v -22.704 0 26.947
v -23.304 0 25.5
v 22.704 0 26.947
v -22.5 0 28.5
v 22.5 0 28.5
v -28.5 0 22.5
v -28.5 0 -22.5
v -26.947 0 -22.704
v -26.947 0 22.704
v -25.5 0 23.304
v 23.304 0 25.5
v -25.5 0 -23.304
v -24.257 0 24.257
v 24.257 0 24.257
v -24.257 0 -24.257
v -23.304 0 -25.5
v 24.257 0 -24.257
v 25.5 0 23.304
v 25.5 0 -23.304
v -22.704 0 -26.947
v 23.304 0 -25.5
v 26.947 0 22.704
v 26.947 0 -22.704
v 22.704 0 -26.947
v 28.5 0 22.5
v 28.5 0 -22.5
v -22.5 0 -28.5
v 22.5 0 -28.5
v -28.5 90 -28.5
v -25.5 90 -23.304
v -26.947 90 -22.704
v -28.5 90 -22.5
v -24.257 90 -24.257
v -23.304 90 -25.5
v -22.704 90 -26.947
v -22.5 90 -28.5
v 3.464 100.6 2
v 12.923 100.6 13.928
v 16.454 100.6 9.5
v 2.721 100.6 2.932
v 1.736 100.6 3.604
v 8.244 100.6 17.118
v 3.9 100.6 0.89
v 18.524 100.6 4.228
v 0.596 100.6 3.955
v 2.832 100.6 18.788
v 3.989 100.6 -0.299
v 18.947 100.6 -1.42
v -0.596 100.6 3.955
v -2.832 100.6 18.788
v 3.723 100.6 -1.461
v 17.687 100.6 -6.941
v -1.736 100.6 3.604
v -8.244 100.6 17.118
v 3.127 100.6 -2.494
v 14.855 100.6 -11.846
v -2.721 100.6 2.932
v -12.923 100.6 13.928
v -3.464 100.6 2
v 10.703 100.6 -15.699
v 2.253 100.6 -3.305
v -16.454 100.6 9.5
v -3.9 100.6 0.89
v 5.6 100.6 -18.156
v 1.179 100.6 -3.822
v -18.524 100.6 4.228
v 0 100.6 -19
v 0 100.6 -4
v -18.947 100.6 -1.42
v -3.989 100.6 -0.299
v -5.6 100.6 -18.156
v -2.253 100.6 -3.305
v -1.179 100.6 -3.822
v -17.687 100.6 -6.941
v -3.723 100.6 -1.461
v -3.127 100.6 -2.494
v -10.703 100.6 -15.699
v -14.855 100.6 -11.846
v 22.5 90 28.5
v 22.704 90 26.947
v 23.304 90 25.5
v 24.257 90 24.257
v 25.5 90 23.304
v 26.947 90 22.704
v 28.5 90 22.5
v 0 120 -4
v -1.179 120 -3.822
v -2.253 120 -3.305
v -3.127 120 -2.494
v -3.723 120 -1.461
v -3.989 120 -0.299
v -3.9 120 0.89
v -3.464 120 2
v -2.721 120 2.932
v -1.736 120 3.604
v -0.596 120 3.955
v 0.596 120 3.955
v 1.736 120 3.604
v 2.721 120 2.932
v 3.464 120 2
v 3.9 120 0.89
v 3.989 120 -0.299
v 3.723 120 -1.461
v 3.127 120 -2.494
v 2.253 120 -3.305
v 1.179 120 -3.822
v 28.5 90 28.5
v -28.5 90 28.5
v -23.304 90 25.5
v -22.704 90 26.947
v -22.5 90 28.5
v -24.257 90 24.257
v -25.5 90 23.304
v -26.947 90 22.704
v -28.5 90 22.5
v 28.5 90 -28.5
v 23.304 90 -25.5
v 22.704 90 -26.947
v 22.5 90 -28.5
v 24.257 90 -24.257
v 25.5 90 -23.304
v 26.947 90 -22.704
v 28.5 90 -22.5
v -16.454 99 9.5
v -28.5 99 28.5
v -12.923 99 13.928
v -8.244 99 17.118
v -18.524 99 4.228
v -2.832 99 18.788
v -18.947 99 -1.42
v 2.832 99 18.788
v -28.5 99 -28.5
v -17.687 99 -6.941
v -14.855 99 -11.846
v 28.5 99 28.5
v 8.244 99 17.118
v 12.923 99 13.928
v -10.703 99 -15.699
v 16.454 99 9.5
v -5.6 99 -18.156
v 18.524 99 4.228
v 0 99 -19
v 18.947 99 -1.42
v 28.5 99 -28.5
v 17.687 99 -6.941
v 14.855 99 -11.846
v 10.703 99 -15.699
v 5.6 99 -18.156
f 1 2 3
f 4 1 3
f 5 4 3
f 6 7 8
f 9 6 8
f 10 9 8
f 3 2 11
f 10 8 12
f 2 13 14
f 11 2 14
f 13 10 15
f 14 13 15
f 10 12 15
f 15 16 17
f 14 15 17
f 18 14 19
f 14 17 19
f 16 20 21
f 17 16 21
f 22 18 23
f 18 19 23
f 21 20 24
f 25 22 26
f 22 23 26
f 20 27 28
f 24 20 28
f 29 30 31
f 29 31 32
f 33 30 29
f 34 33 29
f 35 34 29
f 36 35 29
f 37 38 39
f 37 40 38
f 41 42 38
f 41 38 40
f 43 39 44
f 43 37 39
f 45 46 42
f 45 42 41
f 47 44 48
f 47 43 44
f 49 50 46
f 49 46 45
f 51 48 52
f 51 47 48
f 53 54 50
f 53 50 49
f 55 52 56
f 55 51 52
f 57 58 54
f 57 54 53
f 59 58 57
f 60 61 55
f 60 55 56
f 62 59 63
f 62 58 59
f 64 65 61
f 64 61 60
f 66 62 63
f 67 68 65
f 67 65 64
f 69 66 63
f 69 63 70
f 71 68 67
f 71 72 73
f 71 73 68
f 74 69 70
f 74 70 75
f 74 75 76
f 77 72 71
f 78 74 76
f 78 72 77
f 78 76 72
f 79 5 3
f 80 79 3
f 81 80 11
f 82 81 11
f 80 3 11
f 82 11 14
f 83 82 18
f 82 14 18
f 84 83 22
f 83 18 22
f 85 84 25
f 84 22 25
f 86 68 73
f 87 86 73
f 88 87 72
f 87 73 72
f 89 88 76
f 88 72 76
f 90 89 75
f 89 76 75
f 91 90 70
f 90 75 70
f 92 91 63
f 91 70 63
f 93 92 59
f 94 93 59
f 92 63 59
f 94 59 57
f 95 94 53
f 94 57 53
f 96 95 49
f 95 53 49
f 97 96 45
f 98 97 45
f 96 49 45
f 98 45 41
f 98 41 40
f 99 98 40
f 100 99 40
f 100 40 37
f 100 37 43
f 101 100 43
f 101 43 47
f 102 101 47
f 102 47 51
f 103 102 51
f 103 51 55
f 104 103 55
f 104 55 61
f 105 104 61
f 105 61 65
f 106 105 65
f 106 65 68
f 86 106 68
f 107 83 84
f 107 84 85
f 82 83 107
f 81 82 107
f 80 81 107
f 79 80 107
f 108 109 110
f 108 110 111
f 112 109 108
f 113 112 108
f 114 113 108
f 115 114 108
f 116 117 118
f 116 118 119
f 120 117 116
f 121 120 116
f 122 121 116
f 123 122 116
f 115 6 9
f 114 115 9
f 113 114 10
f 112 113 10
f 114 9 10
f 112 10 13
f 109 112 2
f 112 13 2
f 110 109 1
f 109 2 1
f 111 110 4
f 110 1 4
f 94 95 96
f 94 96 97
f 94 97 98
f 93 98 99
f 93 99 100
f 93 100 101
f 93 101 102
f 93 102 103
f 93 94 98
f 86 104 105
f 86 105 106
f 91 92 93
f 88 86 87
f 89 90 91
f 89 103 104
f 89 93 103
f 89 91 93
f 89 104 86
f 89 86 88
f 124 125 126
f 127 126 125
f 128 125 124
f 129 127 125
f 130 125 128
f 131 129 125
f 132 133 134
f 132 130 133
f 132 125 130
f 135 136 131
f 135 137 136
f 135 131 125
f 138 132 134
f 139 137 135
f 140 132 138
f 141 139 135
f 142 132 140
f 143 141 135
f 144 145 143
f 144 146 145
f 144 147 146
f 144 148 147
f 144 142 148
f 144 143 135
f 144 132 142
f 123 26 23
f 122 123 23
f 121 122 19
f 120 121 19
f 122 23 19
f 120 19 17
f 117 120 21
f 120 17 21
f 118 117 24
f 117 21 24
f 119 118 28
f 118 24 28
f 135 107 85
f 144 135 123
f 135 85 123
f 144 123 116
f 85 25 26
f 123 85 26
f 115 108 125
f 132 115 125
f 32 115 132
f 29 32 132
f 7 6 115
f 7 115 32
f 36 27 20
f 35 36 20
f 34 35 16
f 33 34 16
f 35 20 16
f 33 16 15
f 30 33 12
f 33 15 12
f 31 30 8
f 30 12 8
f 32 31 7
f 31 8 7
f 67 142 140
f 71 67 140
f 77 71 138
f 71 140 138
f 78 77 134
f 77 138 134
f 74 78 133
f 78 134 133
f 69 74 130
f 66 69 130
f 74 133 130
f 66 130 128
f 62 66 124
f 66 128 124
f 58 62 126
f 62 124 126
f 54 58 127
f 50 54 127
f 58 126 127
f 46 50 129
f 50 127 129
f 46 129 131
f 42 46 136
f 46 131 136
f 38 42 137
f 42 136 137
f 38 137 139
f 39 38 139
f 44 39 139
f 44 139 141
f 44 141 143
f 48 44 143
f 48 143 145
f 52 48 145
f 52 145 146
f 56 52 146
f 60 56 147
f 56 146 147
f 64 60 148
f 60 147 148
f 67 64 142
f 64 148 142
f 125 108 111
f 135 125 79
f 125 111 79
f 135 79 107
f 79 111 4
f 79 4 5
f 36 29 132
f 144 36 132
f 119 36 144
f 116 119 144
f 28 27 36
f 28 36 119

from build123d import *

# Parameters (mm, degrees)
SKETCH_1_W               = 57
SKETCH_1_H               = 57
EXTRUDE_1_DEPTH          = 99
CUT_EXTRUDE_1_DEPTH      = 90
SKETCH_3_R               = 4
EXTRUDE_2_DEPTH          = 21
PATTERN_CIRCULAR_1_COUNT = 4
SKETCH_5_R               = 19
EXTRUDE_3_DEPTH          = 1.6


with BuildPart() as part:
    # 草图1 → 凸台-拉伸1 (new body)
    with BuildSketch(Plane(origin=(0, 0, 0), x_dir=(1, 0, 0), z_dir=(0, 1, 0))):
        Rectangle(SKETCH_1_W, SKETCH_1_H)
    extrude(amount=EXTRUDE_1_DEPTH)

    # 草图2 → 切除-拉伸1 (cut)
    with BuildSketch(Plane.XZ):
        with BuildLine():
            Line((28.5, -28.5), (28.5, -22.5))
            ThreePointArc((28.5, -22.5), (24.257359313, -24.257359313), (22.5, -28.5))
            Line((22.5, -28.5), (28.5, -28.5))
        make_face()
    cut_extrude_1 = extrude(amount=-CUT_EXTRUDE_1_DEPTH, mode=Mode.SUBTRACT)

    # 草图3 → 凸台-拉伸2 (add)
    with BuildSketch(Plane(origin=(0, 99, 0), x_dir=(1, 0, 0), z_dir=(0, 1, 0))):
        Circle(SKETCH_3_R)
    extrude(amount=EXTRUDE_2_DEPTH)

    # 阵列(圆周)1: 切除-拉伸1 ×4 about axis
    pattern_circular_1_axis = Axis((0, 120, 0), (0, -1, 0))
    for i in range(1, PATTERN_CIRCULAR_1_COUNT):
        add(cut_extrude_1.rotate(pattern_circular_1_axis, i * 360 / PATTERN_CIRCULAR_1_COUNT), mode=Mode.SUBTRACT)

    # 草图5 → 凸台-拉伸3 (add)
    with BuildSketch(Plane(origin=(0, 99, 0), x_dir=(1, 0, 0), z_dir=(0, 1, 0))):
        Circle(SKETCH_5_R)
    extrude(amount=EXTRUDE_3_DEPTH)


solid = part.part
